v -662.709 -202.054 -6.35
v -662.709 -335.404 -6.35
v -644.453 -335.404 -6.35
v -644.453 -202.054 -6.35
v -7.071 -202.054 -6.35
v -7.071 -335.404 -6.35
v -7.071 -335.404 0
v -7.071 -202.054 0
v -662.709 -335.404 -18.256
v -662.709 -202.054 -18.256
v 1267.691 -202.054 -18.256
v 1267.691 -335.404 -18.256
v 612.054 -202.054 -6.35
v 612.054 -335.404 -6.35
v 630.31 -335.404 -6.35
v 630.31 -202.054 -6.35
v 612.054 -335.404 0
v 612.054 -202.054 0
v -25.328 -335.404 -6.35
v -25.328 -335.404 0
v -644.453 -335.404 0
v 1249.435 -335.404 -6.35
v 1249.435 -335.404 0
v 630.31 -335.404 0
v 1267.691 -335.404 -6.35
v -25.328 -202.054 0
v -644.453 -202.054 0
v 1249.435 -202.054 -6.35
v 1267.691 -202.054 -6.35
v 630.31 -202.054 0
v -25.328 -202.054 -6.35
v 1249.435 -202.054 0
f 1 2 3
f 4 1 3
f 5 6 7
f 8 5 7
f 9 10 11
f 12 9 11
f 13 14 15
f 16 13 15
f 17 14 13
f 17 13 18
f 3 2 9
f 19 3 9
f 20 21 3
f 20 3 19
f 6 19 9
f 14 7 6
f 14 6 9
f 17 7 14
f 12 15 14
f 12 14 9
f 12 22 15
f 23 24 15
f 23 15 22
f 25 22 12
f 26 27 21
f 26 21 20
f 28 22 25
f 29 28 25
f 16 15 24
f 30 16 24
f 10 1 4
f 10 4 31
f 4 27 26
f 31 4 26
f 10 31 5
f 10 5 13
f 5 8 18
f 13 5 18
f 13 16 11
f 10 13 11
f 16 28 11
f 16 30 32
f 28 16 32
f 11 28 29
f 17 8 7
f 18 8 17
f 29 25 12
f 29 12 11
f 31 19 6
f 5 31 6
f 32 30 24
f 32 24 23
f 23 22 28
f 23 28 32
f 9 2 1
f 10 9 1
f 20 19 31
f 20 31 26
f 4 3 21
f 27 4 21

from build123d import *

# Parameters (mm, degrees)
F0_W     = 1930.4
F0_H     = 133.35
F1_DEPTH = 18.25625
F2_W     = 18.25625
F2_H     = 6.35
F3_DEPTH = 133.351
F4_W     = 18.25625
F4_H     = 6.35
F5_DEPTH = 133.351
F6_W     = 18.25625
F6_H     = 6.35
F7_DEPTH = 133.351
F8_W     = 18.25625
F8_H     = 6.35
F9_DEPTH = 133.351


# Not quite as in the source:
# - a length typed as a fraction of an inch, garbled in the dataset ("3 / 203.2 mm" for 3/8 in), is restored


with BuildPart() as f1:
    # F0 (on Top) → F1 (new body)
    with BuildSketch(Plane.XY):
        with Locations((302.4911884634, -268.7286456764)):
            Rectangle(F0_W, F0_H)
    extrude(amount=-F1_DEPTH)

    # F2 (on face) → F3 (cut, through all)
    with BuildSketch(Plane.XZ.offset(335.4036456764)):
        with Locations((-653.5806865366, -3.175)):
            Rectangle(F2_W, F2_H)
    extrude(amount=-F3_DEPTH, mode=Mode.SUBTRACT)

    # F4 (on face) → F5 (cut, through all)
    with BuildSketch(Plane.XZ.offset(335.4036456764)):
        with Locations((1258.5630634634, -3.175)):
            Rectangle(F4_W, F4_H)
    extrude(amount=-F5_DEPTH, mode=Mode.SUBTRACT)

    # F6 (on face) → F7 (cut, through all)
    with BuildSketch(Plane.XZ.offset(335.4036456764)):
        with Locations((621.1818134634, -3.175)):
            Rectangle(F6_W, F6_H)
    extrude(amount=-F7_DEPTH, mode=Mode.SUBTRACT)

    # F8 (on face) → F9 (cut, through all)
    with BuildSketch(Plane.XZ.offset(335.4036456764)):
        with Locations((-16.1994365366, -3.175)):
            Rectangle(F8_W, F8_H)
    extrude(amount=-F9_DEPTH, mode=Mode.SUBTRACT)


solid = f1.part
